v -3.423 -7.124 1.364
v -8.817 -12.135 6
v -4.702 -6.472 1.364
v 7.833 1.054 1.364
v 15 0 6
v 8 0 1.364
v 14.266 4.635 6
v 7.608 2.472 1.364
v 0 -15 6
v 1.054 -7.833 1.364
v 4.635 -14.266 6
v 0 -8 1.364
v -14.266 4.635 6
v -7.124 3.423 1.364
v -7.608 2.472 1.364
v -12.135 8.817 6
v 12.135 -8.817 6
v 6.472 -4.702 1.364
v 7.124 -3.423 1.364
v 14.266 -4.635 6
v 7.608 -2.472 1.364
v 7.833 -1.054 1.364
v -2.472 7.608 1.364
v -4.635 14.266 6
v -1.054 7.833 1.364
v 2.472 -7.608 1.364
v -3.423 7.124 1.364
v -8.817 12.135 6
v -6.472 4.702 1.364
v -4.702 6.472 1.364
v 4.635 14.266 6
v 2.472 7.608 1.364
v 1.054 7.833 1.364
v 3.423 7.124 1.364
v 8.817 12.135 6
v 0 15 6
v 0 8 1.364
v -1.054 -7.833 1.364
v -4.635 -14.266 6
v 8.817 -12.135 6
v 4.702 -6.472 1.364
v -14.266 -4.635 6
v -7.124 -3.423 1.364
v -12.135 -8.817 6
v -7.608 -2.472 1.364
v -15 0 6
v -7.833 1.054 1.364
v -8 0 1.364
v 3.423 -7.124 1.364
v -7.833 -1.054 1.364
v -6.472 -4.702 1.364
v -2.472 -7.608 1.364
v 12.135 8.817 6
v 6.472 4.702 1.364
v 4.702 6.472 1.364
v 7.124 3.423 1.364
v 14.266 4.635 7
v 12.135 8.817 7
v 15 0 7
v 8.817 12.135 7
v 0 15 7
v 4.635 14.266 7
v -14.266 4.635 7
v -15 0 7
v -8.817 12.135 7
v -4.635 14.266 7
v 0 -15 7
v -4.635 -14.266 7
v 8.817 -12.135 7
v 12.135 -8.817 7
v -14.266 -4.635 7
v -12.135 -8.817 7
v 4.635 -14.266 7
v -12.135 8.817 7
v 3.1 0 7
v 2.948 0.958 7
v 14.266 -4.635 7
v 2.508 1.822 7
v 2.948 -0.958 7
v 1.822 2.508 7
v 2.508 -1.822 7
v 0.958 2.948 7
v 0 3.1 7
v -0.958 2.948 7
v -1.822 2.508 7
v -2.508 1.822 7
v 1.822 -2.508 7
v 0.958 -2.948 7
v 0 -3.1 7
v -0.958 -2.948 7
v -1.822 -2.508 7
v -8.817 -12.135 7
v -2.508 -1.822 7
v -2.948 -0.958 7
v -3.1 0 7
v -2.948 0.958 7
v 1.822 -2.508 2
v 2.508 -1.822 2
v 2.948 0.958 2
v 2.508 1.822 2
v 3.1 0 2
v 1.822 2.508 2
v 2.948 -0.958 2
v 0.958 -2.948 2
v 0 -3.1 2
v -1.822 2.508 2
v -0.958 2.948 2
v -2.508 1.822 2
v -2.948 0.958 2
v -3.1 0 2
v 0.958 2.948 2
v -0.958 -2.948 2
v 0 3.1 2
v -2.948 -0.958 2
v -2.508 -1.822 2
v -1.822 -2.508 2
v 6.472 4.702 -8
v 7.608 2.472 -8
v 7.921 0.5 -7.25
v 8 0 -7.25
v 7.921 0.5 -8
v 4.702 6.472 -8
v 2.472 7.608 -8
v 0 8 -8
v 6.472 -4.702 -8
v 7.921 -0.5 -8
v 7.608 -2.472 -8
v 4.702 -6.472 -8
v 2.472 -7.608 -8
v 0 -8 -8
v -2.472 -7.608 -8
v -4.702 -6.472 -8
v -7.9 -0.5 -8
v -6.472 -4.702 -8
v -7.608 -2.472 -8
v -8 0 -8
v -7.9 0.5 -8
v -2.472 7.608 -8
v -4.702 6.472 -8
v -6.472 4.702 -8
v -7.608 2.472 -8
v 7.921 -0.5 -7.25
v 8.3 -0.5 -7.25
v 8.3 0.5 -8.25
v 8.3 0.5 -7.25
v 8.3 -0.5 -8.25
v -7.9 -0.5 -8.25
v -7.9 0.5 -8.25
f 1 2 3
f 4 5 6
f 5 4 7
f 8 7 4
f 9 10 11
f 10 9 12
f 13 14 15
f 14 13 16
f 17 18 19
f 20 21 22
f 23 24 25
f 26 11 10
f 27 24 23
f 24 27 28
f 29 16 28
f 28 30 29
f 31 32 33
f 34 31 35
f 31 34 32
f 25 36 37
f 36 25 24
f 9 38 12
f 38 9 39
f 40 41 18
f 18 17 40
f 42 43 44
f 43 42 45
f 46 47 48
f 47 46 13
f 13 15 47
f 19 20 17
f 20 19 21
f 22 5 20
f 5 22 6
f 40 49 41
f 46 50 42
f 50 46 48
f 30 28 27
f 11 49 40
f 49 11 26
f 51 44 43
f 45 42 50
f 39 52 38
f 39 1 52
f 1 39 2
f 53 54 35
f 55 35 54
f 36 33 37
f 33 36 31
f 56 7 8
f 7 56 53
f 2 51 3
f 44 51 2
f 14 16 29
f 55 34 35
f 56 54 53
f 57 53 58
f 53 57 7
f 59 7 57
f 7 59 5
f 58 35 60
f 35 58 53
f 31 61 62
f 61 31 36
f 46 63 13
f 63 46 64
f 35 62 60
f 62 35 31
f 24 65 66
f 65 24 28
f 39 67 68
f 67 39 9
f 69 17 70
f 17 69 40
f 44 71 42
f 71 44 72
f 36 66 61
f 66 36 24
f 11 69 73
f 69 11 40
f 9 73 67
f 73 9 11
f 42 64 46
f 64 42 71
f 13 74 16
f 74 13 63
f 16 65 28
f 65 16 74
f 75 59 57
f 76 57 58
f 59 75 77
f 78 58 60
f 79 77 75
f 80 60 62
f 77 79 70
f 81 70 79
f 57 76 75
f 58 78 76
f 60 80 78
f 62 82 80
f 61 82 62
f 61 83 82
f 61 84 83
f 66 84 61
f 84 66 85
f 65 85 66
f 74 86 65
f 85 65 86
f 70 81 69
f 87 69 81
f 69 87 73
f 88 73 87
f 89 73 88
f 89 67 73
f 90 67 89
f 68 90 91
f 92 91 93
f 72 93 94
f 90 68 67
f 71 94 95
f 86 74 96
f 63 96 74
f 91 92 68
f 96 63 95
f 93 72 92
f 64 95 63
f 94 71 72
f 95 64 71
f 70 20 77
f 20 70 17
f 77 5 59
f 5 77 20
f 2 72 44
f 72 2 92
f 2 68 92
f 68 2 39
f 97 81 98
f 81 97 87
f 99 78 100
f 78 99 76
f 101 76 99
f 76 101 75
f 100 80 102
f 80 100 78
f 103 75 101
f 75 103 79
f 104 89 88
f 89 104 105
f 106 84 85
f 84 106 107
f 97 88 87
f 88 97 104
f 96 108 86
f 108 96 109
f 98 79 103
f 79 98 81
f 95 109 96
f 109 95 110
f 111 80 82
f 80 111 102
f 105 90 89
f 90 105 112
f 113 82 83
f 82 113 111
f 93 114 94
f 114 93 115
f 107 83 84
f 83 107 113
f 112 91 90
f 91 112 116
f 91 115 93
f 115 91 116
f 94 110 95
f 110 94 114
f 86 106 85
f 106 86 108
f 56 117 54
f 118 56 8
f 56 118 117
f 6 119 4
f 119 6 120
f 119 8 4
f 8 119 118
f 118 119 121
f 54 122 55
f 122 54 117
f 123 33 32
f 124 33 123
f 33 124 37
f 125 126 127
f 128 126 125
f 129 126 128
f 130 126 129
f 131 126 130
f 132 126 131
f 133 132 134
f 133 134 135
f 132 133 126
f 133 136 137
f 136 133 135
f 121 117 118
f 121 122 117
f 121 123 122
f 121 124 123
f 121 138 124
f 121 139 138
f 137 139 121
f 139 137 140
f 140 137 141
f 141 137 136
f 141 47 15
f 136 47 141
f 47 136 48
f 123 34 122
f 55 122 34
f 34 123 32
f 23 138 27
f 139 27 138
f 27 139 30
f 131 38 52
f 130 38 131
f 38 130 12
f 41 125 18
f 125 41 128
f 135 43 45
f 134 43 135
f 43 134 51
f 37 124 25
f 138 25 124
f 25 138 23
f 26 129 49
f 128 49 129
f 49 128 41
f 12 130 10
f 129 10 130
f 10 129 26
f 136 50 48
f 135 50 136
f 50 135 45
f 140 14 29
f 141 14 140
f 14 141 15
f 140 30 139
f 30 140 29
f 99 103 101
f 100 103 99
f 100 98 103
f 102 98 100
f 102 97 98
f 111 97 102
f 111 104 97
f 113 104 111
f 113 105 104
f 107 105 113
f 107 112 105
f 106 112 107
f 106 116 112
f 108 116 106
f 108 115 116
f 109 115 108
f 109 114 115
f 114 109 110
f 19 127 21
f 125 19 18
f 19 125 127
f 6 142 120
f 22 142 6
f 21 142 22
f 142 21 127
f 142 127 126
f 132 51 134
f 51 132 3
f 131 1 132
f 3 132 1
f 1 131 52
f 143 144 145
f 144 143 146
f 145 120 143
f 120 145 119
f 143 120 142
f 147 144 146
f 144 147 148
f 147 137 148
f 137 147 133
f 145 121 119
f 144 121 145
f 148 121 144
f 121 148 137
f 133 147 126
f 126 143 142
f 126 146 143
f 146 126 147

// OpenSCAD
$fn=20;


difference() {
	union() {
		cylinder(r1=5.94, r2=15, h=6);
		translate([0,0,6]) cylinder(r=15, h=1);
	}
	translate([0,0,1.2])
		cylinder(r=3.1, h=6);
}



union() {
	translate([0,0,-8]) cylinder(r=8,h=10);
	translate([-7.9,-0.5,-8.25]) cube([16.2,1,1]);
}
